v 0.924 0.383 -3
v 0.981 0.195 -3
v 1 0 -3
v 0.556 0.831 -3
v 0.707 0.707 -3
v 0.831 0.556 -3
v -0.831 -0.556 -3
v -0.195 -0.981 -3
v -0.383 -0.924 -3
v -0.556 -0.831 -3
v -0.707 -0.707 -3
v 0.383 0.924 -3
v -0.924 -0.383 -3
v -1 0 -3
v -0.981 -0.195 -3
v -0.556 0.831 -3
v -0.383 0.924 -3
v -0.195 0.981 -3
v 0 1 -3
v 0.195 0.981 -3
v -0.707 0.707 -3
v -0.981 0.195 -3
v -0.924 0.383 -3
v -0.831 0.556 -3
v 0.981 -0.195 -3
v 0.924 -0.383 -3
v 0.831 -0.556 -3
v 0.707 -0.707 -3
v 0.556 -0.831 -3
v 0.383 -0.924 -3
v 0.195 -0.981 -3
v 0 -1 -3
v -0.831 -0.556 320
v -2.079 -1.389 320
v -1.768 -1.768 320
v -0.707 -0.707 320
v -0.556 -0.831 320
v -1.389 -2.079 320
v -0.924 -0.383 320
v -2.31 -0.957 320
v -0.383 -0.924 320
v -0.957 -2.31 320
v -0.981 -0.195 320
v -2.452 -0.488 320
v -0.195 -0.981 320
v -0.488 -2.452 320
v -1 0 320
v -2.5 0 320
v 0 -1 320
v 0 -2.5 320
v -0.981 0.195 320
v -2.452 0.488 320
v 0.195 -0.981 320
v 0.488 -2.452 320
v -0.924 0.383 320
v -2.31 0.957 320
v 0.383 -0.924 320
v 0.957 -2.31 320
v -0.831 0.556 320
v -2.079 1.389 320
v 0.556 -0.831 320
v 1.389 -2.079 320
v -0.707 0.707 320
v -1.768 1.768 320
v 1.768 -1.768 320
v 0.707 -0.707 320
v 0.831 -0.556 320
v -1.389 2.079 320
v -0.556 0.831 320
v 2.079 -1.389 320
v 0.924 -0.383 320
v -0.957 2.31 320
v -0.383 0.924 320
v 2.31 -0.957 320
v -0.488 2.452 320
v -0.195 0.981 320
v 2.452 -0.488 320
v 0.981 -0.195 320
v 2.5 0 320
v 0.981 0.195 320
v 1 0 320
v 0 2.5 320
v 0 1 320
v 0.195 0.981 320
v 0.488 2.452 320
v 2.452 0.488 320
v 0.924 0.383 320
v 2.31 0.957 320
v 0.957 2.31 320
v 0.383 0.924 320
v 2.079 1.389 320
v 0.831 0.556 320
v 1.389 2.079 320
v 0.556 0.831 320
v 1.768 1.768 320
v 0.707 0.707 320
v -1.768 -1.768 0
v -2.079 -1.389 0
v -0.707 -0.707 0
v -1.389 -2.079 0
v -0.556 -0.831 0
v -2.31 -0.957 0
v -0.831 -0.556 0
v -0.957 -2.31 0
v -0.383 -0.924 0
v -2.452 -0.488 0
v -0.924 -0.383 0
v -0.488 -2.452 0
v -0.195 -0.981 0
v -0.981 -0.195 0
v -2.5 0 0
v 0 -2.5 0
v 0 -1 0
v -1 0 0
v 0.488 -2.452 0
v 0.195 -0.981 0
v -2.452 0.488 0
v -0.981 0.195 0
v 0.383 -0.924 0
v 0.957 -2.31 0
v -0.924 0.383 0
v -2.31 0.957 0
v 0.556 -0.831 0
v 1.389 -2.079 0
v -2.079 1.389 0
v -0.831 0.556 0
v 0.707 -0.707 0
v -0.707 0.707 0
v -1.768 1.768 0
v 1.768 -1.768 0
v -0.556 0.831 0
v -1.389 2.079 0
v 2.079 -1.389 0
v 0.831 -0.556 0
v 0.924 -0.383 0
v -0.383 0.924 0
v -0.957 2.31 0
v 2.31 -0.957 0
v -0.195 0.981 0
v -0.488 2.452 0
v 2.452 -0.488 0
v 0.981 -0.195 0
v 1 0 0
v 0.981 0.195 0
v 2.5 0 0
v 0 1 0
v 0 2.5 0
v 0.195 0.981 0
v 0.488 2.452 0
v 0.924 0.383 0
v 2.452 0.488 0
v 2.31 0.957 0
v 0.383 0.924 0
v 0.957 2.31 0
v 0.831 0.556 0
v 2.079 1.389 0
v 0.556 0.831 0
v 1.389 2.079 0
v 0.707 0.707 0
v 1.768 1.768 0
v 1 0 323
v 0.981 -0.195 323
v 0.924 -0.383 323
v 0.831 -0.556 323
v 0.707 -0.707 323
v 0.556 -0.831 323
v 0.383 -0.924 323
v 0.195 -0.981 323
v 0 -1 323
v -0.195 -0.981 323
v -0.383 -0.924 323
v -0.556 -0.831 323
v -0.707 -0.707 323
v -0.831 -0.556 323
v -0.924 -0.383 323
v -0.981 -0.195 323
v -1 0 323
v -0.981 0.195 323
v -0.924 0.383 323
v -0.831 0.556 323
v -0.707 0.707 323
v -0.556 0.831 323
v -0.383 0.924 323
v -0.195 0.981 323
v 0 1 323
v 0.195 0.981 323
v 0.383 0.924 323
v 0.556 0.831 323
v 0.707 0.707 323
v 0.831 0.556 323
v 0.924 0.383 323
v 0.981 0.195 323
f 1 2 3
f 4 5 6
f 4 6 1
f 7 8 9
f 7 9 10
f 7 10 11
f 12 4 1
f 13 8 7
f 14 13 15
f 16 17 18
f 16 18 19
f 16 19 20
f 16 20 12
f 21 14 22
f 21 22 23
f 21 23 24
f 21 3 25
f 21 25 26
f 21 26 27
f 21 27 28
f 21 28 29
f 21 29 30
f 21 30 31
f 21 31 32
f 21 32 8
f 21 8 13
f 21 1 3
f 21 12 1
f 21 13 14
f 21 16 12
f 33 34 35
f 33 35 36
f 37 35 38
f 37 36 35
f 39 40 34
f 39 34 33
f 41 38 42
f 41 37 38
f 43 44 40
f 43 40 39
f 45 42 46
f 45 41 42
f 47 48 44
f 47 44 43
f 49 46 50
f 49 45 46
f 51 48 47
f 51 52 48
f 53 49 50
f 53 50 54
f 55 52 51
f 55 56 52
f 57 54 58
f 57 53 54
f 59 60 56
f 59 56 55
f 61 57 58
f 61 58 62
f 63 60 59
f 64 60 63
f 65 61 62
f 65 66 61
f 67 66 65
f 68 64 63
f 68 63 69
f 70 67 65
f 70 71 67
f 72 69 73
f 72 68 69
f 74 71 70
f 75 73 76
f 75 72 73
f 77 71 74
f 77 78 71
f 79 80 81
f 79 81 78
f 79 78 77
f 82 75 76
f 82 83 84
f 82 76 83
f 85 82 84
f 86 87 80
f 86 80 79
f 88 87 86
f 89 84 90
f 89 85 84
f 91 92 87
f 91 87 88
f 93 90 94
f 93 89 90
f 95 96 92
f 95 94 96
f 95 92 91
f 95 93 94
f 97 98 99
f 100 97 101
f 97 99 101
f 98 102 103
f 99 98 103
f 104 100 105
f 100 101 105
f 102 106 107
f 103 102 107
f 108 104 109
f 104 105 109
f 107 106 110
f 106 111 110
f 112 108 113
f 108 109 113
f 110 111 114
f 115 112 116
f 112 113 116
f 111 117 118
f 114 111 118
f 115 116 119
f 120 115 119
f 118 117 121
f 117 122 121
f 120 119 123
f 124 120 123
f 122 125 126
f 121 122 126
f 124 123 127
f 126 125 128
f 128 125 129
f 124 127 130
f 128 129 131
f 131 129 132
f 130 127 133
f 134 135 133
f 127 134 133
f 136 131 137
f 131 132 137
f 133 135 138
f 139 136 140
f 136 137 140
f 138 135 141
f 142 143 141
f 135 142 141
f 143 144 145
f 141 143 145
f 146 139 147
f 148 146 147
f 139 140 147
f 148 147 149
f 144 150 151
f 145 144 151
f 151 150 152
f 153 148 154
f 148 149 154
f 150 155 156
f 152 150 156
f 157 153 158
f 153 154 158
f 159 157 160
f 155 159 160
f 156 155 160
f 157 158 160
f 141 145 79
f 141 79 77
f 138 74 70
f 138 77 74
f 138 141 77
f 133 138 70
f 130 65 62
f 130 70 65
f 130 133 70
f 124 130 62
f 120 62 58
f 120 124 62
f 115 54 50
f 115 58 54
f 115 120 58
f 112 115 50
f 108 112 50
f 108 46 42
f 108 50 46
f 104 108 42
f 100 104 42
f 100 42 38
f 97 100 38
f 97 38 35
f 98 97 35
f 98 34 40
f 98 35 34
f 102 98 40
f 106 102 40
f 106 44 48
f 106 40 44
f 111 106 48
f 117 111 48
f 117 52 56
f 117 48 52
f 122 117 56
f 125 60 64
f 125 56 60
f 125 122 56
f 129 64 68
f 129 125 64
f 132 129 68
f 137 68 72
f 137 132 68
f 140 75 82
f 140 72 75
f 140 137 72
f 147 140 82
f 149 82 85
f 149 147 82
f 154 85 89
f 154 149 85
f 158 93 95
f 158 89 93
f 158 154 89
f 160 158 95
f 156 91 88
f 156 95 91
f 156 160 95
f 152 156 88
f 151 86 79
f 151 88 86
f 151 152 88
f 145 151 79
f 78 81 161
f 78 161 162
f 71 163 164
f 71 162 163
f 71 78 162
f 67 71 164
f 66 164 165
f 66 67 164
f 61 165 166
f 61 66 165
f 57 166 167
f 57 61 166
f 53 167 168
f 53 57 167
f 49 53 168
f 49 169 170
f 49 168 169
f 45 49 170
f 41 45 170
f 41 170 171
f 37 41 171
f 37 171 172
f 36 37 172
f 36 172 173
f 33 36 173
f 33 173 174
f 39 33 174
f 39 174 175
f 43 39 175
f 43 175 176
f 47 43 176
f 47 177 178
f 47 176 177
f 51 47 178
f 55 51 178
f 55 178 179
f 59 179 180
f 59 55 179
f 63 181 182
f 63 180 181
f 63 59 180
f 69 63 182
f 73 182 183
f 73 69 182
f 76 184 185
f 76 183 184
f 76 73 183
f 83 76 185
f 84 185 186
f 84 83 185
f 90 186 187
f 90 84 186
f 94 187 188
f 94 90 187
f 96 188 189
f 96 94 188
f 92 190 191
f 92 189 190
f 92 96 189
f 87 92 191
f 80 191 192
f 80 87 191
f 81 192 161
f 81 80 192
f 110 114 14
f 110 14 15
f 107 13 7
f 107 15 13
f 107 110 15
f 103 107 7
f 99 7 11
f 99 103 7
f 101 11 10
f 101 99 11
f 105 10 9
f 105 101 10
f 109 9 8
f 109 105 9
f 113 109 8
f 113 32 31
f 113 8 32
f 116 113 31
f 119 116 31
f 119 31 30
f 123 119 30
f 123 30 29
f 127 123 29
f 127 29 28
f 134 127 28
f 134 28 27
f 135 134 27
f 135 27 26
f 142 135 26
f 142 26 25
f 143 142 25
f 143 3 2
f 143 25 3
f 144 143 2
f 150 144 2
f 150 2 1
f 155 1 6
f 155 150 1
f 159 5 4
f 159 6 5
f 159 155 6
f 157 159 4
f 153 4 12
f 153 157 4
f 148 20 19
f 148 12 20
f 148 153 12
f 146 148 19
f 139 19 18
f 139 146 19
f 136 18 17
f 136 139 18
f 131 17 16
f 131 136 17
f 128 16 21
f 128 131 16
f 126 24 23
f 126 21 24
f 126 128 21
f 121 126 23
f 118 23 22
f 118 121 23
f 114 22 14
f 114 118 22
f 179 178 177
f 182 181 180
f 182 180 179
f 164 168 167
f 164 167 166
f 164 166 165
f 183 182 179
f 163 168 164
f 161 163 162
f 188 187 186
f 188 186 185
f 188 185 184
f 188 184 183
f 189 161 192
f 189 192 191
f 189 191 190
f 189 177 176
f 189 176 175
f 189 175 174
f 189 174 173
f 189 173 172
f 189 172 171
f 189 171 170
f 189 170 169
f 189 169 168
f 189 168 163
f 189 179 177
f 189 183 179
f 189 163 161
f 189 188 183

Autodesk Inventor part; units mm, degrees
ref_plane "YZ Plane" through (0, 0, 0) normal (1, 0, 0) x (0, 1, 0)
ref_plane "XZ Plane" through (0, 0, 0) normal (0, 1, 0) x (-1, 0, 0)
ref_plane "XY Plane" through (0, 0, 0) normal (0, 0, 1) x (1, 0, 0)
sketch "Sketch1" plane through (0, 0, 0) normal (0, 0, 1) x (1, 0, 0)
  circle A0 centre (0, 0) radius 2.5
  dimension "d0" = 5
extrude "Extrusion1" add sketch "Sketch1" along normal blind 320
sketch "Sketch2" plane through (0, 0, 320) normal (0, 0, 1) x (1, 0, 0)
  circle A0 centre (0, 0) radius 2.5 projected
  circle A1 centre (0, 0) radius 1
  dimension "d3" = 2
extrude "Extrusion2" add sketch "Sketch2" along normal blind 3 contours A1
sketch "Sketch3" plane through (0, 0, 0) normal (0, 0, -1) x (-1, 0, 0)
  circle A0 centre (0, 0) radius 1
  dimension "d6" = 2
extrude "Extrusion3" add sketch "Sketch3" along normal blind 3
properties part number "Bone-32cm"
